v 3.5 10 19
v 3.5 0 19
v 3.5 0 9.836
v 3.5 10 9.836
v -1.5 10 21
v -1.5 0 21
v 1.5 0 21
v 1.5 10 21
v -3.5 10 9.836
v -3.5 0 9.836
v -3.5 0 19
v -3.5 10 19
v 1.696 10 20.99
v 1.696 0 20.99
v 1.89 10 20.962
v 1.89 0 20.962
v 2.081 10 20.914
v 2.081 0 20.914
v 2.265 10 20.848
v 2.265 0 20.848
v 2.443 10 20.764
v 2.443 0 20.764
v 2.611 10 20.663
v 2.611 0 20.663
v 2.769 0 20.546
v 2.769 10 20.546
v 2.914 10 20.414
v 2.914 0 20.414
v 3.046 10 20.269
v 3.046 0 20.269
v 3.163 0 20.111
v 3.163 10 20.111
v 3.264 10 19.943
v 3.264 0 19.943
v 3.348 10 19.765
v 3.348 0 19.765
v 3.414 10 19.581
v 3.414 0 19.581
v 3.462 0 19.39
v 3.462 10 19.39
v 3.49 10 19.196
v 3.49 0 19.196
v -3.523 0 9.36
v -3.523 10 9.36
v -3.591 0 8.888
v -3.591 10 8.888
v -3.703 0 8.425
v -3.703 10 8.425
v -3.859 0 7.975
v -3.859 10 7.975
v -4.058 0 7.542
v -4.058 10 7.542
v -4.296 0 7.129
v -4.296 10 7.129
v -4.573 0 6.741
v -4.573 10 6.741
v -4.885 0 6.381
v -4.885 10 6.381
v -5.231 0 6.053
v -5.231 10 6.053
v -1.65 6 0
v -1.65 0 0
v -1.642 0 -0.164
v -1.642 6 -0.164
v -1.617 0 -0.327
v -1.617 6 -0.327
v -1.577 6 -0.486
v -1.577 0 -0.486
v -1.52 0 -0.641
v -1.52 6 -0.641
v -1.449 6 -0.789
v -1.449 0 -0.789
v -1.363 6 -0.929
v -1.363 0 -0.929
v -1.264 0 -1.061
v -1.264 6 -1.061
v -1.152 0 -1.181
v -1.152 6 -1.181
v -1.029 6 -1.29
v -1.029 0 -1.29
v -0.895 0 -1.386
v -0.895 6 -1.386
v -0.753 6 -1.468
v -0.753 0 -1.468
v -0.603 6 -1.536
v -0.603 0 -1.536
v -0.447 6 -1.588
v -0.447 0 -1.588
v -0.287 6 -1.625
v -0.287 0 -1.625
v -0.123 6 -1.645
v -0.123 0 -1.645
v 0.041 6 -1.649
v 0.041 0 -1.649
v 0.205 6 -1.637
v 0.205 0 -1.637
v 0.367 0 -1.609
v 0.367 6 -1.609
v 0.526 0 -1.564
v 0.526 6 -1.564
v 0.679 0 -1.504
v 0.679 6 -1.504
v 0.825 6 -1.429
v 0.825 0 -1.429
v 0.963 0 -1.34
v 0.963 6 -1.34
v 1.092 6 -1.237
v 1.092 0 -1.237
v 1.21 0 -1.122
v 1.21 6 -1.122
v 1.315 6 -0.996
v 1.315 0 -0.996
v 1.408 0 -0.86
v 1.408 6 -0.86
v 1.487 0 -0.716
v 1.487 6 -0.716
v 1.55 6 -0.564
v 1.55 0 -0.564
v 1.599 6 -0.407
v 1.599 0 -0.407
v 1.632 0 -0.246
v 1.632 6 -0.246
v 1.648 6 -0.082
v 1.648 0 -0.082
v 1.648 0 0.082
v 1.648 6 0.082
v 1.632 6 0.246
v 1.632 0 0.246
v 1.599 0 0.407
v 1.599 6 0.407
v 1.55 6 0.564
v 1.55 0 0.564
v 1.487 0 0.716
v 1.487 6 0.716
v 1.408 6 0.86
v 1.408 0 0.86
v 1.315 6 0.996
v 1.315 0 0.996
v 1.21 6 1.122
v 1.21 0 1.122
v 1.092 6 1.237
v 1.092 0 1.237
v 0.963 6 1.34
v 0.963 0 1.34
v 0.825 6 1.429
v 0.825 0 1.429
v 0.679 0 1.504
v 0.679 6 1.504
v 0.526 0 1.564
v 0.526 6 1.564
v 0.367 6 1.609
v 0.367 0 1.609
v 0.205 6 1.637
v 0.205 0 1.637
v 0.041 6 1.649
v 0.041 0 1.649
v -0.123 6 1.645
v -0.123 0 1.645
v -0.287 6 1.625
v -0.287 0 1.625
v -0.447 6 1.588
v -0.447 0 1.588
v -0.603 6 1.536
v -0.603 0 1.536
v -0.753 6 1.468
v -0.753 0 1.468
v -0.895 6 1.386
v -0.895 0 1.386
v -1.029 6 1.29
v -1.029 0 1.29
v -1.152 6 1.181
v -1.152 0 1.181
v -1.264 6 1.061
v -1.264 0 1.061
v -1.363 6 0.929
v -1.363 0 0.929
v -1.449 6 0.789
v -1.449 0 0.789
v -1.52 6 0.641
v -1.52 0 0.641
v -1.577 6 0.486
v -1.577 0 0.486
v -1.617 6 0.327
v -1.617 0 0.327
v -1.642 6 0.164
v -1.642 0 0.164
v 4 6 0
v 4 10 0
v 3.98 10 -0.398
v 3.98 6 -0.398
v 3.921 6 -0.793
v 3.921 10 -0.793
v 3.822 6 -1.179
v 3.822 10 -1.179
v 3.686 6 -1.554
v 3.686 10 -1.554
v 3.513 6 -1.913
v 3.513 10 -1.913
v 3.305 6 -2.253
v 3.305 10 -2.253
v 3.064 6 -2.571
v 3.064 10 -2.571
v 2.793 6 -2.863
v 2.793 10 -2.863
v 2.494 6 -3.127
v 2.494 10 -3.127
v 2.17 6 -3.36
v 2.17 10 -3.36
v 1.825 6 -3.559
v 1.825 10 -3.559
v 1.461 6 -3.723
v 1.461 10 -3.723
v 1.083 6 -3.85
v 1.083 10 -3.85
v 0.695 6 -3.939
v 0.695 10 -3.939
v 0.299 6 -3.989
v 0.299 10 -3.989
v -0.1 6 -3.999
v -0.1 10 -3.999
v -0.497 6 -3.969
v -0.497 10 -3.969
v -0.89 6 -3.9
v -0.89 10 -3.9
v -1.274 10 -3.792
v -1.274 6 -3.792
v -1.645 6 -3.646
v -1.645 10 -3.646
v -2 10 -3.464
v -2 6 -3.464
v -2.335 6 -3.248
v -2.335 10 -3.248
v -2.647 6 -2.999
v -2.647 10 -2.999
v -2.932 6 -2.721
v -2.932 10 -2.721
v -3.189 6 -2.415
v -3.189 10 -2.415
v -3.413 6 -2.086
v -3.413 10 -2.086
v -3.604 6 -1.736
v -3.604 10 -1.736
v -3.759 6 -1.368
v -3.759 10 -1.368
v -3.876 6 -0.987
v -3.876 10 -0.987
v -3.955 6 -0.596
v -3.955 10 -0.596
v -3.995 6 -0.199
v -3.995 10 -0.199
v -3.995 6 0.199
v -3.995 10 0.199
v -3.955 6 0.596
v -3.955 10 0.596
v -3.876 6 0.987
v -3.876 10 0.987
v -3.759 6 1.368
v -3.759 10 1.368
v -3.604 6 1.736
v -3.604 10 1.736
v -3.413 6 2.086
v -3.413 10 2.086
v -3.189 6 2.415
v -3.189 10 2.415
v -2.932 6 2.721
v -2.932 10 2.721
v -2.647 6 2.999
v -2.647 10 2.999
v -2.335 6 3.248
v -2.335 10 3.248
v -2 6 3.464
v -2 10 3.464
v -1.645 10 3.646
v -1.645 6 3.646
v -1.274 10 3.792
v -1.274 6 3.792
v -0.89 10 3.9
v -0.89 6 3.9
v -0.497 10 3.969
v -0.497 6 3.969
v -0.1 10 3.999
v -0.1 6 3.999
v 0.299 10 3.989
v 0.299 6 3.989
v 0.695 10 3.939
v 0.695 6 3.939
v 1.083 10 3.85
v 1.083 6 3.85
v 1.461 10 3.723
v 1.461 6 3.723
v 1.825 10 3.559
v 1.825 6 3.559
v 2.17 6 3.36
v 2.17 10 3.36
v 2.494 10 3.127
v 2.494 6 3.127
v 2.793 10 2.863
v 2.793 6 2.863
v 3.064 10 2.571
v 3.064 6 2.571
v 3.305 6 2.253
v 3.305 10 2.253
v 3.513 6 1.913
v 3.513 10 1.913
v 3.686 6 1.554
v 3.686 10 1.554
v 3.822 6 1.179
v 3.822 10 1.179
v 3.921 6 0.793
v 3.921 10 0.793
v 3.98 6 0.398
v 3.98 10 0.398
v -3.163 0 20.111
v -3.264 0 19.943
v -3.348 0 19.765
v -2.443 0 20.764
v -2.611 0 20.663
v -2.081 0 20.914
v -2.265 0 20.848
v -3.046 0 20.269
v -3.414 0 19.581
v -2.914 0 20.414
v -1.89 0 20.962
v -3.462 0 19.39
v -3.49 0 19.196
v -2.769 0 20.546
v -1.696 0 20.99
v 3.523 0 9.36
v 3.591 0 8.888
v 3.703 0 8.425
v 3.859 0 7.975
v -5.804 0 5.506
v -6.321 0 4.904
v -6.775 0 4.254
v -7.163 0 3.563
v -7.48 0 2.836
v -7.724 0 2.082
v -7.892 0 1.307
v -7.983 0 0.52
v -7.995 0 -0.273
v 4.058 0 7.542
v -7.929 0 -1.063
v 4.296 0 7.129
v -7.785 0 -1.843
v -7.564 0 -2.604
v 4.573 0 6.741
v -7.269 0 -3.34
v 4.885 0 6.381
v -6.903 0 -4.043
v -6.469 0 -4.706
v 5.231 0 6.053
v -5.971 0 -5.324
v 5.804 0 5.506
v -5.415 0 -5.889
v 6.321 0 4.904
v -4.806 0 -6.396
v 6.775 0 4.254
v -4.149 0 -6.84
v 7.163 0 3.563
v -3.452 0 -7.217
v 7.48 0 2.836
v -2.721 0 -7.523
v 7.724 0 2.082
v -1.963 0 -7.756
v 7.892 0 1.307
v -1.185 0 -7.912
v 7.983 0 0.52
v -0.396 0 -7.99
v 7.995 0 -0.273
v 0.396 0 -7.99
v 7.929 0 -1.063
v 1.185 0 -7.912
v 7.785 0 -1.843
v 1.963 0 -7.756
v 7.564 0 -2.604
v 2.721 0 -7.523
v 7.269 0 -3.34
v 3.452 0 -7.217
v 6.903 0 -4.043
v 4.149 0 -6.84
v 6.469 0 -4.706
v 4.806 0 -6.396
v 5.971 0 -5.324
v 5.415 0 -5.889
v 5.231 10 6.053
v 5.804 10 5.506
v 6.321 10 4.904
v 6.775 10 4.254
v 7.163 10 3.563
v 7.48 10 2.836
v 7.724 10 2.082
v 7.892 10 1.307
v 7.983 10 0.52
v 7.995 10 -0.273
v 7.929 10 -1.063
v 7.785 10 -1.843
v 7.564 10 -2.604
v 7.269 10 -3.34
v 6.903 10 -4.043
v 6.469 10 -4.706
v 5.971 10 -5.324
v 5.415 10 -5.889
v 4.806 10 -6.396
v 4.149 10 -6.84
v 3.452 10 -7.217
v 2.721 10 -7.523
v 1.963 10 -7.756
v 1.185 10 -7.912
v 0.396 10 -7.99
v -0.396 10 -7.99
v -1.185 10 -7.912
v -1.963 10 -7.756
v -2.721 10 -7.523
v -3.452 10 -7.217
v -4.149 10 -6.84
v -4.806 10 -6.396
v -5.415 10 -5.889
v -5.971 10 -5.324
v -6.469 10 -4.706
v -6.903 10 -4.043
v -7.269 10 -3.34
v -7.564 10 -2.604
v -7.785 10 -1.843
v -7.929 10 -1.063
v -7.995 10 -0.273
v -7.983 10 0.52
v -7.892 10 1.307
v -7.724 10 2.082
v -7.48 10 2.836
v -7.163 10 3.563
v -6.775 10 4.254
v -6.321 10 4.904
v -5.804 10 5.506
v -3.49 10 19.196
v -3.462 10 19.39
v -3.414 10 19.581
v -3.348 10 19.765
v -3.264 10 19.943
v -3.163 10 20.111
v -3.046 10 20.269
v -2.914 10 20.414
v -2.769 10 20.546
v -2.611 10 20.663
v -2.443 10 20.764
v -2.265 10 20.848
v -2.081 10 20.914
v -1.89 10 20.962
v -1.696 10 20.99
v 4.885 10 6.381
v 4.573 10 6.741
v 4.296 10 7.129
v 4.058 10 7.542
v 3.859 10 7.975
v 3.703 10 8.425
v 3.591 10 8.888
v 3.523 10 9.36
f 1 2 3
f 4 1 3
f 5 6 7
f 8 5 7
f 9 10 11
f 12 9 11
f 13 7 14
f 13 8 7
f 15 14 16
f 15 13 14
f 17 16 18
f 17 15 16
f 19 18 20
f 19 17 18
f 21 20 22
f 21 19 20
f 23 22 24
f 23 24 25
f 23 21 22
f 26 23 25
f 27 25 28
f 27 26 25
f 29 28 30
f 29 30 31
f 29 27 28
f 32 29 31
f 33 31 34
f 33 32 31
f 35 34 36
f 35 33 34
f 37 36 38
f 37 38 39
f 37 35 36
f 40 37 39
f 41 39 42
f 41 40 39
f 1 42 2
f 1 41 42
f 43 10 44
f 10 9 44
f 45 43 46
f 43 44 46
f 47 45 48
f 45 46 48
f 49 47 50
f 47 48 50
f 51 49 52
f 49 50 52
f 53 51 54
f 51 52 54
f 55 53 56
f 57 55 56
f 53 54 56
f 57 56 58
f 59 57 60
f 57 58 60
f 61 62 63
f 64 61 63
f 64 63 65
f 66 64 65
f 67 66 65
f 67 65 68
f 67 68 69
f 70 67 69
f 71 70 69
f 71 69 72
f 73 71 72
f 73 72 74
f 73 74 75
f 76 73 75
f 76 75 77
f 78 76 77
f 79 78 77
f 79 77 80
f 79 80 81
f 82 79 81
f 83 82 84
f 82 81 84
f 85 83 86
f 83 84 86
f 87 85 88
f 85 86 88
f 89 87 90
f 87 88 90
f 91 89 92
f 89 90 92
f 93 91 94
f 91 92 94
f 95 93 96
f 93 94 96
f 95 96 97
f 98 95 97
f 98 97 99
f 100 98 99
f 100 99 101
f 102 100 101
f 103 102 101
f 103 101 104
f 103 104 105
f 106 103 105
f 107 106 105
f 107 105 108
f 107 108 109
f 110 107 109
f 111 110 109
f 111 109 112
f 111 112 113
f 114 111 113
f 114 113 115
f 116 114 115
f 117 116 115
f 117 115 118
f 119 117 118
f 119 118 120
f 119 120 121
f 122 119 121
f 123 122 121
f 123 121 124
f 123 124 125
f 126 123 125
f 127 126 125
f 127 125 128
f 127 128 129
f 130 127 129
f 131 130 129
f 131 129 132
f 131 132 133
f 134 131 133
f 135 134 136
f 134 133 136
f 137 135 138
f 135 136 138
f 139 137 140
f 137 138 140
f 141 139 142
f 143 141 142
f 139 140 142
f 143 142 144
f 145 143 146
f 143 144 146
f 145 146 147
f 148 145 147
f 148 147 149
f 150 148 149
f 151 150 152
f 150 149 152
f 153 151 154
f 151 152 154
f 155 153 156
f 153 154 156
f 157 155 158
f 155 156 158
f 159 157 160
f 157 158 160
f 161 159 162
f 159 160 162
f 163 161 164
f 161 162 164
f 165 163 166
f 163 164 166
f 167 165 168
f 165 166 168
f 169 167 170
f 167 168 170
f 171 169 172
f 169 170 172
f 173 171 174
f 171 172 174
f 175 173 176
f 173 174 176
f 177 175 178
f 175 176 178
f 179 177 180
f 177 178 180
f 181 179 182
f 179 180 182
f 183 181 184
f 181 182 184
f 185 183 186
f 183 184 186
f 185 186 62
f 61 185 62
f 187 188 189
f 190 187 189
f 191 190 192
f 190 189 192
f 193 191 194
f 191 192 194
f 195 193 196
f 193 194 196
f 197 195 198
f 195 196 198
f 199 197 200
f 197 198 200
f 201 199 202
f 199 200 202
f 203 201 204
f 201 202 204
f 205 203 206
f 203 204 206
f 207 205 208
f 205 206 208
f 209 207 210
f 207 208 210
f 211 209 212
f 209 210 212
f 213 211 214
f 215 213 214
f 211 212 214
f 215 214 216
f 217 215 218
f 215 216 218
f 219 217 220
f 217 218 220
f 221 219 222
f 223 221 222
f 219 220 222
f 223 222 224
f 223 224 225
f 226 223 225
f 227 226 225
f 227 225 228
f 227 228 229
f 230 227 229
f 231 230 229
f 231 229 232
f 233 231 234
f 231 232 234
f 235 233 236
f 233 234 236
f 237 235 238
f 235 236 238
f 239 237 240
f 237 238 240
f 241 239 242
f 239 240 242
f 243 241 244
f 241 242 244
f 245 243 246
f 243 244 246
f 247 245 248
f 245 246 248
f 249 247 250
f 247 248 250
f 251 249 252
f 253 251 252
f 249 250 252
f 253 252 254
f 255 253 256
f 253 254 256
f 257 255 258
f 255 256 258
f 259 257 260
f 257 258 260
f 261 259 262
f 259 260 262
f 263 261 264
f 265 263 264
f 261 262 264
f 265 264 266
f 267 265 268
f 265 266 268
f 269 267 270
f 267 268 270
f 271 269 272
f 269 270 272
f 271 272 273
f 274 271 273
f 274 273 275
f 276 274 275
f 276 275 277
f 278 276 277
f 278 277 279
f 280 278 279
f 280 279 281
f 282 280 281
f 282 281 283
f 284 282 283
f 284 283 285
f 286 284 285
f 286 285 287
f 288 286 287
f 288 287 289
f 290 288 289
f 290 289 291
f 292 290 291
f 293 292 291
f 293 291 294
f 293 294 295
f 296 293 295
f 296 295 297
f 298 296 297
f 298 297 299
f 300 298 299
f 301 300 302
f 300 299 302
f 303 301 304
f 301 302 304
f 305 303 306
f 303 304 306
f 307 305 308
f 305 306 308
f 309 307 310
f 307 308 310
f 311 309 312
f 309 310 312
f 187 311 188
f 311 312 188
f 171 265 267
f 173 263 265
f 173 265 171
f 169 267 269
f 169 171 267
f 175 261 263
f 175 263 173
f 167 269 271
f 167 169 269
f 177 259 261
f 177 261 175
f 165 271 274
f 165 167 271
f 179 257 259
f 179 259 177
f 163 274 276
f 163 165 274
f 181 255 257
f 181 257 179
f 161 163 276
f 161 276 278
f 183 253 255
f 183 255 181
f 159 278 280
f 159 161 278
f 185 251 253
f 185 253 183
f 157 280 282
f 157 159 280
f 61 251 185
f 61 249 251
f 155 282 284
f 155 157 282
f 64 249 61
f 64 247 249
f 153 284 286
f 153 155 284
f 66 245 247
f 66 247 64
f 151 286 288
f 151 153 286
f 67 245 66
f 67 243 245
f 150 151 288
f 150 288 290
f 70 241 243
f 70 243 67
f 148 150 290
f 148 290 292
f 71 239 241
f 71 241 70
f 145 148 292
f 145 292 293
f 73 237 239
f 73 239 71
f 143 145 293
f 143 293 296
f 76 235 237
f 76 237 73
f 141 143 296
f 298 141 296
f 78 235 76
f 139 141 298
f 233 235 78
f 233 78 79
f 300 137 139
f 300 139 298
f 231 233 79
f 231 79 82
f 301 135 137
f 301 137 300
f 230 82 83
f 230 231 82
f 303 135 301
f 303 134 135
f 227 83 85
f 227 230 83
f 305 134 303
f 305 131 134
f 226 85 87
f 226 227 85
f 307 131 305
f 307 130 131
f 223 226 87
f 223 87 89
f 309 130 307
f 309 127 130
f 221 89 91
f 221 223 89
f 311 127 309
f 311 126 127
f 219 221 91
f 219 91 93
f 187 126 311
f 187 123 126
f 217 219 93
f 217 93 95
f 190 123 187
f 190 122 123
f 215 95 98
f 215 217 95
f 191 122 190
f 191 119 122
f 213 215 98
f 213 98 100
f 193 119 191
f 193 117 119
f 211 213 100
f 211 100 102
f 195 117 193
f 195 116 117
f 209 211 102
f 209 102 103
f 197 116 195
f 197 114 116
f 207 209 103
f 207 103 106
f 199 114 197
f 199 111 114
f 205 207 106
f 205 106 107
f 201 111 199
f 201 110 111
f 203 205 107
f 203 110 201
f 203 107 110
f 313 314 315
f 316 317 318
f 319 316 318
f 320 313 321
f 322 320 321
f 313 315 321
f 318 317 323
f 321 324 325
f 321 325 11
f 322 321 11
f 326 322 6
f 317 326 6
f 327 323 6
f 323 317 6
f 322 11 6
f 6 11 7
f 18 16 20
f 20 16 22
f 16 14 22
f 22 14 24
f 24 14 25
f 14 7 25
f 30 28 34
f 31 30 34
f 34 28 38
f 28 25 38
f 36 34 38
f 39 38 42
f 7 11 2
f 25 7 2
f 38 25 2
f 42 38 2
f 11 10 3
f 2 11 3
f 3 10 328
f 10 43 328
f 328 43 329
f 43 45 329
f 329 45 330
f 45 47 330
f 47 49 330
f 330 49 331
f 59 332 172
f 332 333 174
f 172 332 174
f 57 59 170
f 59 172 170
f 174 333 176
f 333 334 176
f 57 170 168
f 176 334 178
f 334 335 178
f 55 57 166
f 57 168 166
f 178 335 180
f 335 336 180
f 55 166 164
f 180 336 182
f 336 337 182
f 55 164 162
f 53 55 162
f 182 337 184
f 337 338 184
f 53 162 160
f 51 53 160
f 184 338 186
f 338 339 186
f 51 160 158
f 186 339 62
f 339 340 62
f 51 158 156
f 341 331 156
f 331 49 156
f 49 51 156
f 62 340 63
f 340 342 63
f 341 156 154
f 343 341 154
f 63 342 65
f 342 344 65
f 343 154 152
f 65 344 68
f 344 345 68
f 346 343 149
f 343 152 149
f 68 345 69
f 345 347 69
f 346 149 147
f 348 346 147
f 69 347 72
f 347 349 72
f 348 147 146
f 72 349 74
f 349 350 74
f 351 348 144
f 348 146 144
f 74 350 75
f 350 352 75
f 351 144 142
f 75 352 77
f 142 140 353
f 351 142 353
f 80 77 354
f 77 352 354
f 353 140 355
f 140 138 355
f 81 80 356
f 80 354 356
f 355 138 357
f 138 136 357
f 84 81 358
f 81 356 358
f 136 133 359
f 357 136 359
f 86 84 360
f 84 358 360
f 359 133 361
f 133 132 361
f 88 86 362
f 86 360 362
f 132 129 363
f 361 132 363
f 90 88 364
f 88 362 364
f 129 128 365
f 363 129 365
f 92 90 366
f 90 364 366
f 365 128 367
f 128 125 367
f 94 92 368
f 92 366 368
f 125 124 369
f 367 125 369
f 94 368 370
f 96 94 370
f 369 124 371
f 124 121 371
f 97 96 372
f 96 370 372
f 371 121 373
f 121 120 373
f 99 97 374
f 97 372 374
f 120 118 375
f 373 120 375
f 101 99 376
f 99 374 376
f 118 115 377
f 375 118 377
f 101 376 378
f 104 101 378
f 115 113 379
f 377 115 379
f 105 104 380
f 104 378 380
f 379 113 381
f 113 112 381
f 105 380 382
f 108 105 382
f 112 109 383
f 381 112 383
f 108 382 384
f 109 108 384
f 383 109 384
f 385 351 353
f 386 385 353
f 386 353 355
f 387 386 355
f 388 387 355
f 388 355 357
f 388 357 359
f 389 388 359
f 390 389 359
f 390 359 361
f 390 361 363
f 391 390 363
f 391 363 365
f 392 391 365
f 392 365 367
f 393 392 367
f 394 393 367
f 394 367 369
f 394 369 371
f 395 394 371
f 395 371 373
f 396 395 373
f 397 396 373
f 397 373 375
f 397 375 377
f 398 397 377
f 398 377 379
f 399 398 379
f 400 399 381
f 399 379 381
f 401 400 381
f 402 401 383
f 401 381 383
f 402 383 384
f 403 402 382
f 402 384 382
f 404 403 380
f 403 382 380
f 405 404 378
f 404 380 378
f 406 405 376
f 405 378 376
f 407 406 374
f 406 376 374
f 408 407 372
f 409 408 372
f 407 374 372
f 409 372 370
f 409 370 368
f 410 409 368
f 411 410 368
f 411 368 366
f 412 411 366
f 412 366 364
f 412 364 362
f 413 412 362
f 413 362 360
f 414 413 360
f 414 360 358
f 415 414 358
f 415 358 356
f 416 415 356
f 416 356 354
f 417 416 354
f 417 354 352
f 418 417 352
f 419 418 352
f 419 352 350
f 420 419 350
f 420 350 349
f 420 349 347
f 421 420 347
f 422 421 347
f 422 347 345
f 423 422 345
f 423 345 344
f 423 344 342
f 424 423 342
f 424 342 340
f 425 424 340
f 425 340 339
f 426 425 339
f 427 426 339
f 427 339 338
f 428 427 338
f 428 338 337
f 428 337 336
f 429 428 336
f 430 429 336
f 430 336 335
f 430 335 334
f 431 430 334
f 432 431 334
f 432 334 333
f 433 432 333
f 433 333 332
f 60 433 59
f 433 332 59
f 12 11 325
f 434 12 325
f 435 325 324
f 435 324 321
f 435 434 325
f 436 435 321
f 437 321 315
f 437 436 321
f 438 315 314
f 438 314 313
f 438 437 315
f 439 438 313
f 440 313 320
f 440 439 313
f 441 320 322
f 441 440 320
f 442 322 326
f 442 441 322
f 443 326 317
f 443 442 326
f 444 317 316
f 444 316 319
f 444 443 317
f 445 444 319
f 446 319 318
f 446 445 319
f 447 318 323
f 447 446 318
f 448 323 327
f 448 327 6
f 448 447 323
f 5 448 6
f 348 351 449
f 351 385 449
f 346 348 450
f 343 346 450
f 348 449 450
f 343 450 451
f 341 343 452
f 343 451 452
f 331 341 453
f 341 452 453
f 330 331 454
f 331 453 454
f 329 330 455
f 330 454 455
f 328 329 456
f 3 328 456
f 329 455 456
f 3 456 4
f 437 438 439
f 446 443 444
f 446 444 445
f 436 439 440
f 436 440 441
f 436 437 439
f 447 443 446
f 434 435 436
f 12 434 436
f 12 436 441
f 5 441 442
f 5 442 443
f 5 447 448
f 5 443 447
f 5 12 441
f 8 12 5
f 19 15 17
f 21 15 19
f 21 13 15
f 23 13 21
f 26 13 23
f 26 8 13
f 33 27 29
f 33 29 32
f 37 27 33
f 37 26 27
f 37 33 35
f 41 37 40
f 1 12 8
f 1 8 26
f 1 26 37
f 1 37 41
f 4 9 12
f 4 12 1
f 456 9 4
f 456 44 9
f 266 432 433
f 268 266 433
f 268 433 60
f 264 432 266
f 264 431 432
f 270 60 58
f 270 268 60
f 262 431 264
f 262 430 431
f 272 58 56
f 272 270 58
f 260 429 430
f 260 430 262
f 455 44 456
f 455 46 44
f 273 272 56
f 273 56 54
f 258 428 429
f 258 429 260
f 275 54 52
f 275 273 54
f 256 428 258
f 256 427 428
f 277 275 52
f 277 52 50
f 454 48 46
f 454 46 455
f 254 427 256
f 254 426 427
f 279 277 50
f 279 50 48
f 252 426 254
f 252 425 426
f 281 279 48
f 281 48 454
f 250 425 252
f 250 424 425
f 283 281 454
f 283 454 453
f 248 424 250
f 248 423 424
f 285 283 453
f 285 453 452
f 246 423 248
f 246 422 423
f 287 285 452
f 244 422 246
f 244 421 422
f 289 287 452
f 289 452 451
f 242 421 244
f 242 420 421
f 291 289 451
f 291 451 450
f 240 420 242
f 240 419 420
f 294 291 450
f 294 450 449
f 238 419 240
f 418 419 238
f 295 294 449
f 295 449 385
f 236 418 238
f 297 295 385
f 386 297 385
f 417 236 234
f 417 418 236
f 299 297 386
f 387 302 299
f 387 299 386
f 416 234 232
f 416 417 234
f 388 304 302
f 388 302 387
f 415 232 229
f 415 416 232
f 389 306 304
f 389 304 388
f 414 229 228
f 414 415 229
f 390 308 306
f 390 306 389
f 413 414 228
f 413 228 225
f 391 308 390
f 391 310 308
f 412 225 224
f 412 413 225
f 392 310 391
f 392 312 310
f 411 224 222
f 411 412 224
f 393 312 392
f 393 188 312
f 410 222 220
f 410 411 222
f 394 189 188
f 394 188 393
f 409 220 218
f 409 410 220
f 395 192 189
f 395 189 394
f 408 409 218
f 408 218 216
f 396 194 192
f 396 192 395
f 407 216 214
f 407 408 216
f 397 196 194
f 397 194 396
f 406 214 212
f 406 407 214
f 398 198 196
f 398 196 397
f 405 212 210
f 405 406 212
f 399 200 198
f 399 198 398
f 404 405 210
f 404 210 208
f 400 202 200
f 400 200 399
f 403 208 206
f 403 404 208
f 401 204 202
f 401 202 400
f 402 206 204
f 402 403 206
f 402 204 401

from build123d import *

# Parameters (mm, degrees)
EXTRUDE_1_DEPTH     = 10
FILLET_1_R          = 2
FILLET_2_R          = 5
SKETCH_4_R          = 4
CUT_EXTRUDE_1_DEPTH = 4
M4X0_71_D           = 3.3


with BuildPart() as part:
    # Эскиз1 → Бобышка-Вытянуть1 (new body)
    with BuildSketch(Plane(origin=(0, 0, 0), x_dir=(1, 0, 0), z_dir=(0, 1, 0))):
        with BuildLine():
            Line((-3.5, -7.193747285), (-3.5, -21))
            Line((-3.5, -21), (3.5, -21))
            Line((3.5, -21), (3.5, -7.193747285))
            ThreePointArc((3.5, -7.193747285), (0, 8), (-3.5, -7.193747285))
        make_face()
    extrude(amount=EXTRUDE_1_DEPTH)

    # Скругление1
    fillet_1_edges = [part.edges().sort_by_distance(p)[0] for p in [
        (3.5, 5, 21),
        (-3.5, 5, 21),
    ]]
    fillet(fillet_1_edges, radius=FILLET_1_R)

    # Скругление2
    fillet_2_edges = [part.edges().sort_by_distance(p)[0] for p in [
        (-3.5, 5, 7.193747285),
        (3.5, 5, 7.193747285),
    ]]
    fillet(fillet_2_edges, radius=FILLET_2_R)

    # Эскиз4 → Вырез-Вытянуть1 (cut)
    with BuildSketch(Plane(origin=(0, 10, 0), x_dir=(1, 0, 0), z_dir=(0, 1, 0))):
        Circle(SKETCH_4_R)
    extrude(amount=-CUT_EXTRUDE_1_DEPTH, mode=Mode.SUBTRACT)

    # Отверстие обработанное метчиком M4x0.71 (through all)
    with Locations(Plane(origin=(0, 6, 0), x_dir=(1, 0, 0), z_dir=(0, 1, 0))):
        with Locations((0, 0)):
            Hole(M4X0_71_D / 2)


solid = part.part
